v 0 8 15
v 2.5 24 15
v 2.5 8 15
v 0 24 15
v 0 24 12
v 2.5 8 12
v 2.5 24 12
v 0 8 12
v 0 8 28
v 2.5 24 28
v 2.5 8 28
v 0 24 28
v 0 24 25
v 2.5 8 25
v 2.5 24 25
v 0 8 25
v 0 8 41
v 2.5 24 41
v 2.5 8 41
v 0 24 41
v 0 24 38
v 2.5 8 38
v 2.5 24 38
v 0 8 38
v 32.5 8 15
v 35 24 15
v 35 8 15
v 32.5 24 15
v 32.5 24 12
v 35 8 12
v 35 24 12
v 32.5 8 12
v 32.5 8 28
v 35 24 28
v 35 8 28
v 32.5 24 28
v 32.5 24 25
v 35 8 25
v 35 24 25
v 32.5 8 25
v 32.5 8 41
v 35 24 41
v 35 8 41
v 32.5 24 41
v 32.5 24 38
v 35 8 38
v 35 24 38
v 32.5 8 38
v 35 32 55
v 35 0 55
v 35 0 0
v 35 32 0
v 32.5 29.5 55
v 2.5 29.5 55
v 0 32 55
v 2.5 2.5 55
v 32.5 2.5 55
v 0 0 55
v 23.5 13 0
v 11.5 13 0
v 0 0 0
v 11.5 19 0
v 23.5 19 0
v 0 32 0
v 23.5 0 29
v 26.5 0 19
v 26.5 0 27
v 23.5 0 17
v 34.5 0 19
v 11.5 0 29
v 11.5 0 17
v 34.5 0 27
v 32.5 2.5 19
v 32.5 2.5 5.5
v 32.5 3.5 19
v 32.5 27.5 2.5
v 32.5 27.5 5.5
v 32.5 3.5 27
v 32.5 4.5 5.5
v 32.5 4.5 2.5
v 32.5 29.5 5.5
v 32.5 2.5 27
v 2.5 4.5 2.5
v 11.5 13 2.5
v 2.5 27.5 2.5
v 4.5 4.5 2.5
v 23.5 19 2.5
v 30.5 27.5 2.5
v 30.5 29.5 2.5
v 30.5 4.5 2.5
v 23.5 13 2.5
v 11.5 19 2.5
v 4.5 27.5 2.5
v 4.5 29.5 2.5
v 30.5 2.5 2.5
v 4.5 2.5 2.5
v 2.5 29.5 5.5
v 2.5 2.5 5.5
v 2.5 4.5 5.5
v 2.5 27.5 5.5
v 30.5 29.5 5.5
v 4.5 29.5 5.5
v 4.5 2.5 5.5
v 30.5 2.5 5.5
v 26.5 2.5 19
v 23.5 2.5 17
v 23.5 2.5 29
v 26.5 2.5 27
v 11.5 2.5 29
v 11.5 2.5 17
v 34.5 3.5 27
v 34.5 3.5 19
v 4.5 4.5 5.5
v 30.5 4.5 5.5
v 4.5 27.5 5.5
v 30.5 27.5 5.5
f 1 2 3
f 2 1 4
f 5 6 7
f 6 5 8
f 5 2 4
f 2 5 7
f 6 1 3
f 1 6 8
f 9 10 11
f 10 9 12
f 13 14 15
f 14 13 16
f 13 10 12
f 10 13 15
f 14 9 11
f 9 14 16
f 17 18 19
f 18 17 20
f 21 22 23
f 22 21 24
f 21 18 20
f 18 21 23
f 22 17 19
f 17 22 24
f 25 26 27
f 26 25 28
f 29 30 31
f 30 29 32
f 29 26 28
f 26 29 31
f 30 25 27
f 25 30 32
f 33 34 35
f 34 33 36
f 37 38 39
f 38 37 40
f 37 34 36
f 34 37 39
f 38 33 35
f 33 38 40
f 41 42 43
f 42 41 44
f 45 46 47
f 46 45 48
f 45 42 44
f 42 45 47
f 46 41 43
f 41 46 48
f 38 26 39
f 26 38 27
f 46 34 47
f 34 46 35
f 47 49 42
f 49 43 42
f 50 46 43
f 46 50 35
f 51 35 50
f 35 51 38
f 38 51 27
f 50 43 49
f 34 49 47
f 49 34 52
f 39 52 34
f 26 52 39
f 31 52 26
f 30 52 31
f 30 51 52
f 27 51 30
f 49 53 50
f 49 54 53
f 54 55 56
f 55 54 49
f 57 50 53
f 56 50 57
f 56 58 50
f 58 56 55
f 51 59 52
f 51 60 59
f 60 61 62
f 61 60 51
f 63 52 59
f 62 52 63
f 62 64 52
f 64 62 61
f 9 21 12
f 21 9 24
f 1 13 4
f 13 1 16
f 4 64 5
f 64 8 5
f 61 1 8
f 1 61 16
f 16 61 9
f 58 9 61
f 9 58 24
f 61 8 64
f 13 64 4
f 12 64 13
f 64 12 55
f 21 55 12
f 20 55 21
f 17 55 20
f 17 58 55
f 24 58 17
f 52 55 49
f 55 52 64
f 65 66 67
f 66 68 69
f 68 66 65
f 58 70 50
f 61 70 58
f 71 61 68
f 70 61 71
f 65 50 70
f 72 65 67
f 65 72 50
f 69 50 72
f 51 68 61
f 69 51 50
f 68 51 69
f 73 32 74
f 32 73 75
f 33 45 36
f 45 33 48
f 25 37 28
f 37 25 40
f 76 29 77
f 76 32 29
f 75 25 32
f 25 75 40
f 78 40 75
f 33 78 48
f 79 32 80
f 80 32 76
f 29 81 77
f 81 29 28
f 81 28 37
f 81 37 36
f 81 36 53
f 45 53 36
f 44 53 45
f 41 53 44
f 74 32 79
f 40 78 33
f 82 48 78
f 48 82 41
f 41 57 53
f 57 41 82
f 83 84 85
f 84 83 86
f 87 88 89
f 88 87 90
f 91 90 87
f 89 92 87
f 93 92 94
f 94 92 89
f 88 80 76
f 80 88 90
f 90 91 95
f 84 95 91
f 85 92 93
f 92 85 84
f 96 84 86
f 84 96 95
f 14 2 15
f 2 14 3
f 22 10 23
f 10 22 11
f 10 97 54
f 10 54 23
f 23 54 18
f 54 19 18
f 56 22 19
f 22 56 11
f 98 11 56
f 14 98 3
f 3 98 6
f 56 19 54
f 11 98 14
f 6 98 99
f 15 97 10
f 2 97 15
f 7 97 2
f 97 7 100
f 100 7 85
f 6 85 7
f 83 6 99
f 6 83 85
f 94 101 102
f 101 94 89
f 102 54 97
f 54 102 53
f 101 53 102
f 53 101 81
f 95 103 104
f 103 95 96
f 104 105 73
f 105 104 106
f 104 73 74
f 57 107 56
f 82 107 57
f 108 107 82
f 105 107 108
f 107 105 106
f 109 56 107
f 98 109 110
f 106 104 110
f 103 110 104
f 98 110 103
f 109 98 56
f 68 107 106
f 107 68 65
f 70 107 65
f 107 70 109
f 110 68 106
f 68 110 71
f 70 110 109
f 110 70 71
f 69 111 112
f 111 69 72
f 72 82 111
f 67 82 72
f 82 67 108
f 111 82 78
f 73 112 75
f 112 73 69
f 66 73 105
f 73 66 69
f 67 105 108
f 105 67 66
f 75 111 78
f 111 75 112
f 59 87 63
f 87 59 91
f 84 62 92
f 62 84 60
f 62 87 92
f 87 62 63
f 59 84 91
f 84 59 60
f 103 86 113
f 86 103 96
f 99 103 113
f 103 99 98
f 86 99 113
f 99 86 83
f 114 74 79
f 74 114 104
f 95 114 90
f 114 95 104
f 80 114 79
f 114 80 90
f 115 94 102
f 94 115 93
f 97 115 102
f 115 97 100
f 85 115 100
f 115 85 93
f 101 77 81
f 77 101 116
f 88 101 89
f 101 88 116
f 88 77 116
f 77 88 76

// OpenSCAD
// ============================================================
// BOÎTIER ESP32-CAM (fermé, amélioré)
// ESP32-CAM: 27mm × 40mm × 15mm
// Boîtier ext: 35mm(L) × 32mm(l) × 55mm(H)
// Parois: 2.5mm
// Ouvertures: objectif 12×12, flash 8×8, USB 12×6
// Fentes ventilation + ouverture antenne WiFi
// ============================================================

$fn = 32;

// Paramètres
CW = 35;     // Largeur ext
CD = 32;     // Profondeur ext
CH = 55;     // Hauteur ext
WT = 2.5;    // Épaisseur paroi

// Ouvertures
LENS_W = 12;    // Trou objectif
LENS_H = 12;
FLASH_W = 8;    // Trou flash
FLASH_H = 8;
USB_W = 12;     // Trou USB
USB_H = 6;

module boitier_esp32cam() {
    difference() {
        // Corps externe
        cube([CW, CD, CH]);

        // Évidement intérieur (fond WT, pas de couvercle = ouvert en haut)
        translate([WT, WT, WT])
            cube([CW - 2*WT, CD - 2*WT, CH - WT + 1]);

        // ---- Face avant (Y=0) ----
        // Trou objectif: centré en X, à 18mm du bas
        translate([(CW - LENS_W)/2, -1, CH - 38])
            cube([LENS_W, WT + 2, LENS_H]);

        // Trou flash LED: à droite de l'objectif
        translate([(CW - FLASH_W)/2 + 13, -1, CH - 36])
            cube([FLASH_W, WT + 2, FLASH_H]);

        // ---- Face bas (Z=0): trou USB/alimentation centré ----
        translate([(CW - USB_W)/2, (CD - USB_H)/2, -1])
            cube([USB_W, USB_H, WT + 2]);

        // ---- Face haut (Z=CH): ouverture antenne WiFi ----
        translate([CW - WT - 6, (CD - 20)/2, CH - WT - 1])
            cube([5, 20, WT + 2]);

        // ---- Fentes ventilation latérales gauche (X=0) ----
        for (z = [12, 25, 38]) {
            translate([-1, (CD - 16)/2, z])
                cube([WT + 2, 16, 3]);
        }

        // ---- Fentes ventilation latérales droite (X=CW) ----
        for (z = [12, 25, 38]) {
            translate([CW - WT - 1, (CD - 16)/2, z])
                cube([WT + 2, 16, 3]);
        }

        // ---- Rainure de guidage pour ESP32-CAM (rails intérieurs) ----
        translate([WT, WT, WT + 5])
            cube([1.5, CD - 2*WT, CH]);
        translate([CW - WT - 1.5, WT, WT + 5])
            cube([1.5, CD - 2*WT, CH]);
    }

    // ---- Bossages internes pour caler l'ESP32-CAM ----
    translate([WT, WT, WT])
        cube([2, 2, 3]);
    translate([CW - WT - 2, WT, WT])
        cube([2, 2, 3]);
    translate([WT, CD - WT - 2, WT])
        cube([2, 2, 3]);
    translate([CW - WT - 2, CD - WT - 2, WT])
        cube([2, 2, 3]);
}

boitier_esp32cam();
